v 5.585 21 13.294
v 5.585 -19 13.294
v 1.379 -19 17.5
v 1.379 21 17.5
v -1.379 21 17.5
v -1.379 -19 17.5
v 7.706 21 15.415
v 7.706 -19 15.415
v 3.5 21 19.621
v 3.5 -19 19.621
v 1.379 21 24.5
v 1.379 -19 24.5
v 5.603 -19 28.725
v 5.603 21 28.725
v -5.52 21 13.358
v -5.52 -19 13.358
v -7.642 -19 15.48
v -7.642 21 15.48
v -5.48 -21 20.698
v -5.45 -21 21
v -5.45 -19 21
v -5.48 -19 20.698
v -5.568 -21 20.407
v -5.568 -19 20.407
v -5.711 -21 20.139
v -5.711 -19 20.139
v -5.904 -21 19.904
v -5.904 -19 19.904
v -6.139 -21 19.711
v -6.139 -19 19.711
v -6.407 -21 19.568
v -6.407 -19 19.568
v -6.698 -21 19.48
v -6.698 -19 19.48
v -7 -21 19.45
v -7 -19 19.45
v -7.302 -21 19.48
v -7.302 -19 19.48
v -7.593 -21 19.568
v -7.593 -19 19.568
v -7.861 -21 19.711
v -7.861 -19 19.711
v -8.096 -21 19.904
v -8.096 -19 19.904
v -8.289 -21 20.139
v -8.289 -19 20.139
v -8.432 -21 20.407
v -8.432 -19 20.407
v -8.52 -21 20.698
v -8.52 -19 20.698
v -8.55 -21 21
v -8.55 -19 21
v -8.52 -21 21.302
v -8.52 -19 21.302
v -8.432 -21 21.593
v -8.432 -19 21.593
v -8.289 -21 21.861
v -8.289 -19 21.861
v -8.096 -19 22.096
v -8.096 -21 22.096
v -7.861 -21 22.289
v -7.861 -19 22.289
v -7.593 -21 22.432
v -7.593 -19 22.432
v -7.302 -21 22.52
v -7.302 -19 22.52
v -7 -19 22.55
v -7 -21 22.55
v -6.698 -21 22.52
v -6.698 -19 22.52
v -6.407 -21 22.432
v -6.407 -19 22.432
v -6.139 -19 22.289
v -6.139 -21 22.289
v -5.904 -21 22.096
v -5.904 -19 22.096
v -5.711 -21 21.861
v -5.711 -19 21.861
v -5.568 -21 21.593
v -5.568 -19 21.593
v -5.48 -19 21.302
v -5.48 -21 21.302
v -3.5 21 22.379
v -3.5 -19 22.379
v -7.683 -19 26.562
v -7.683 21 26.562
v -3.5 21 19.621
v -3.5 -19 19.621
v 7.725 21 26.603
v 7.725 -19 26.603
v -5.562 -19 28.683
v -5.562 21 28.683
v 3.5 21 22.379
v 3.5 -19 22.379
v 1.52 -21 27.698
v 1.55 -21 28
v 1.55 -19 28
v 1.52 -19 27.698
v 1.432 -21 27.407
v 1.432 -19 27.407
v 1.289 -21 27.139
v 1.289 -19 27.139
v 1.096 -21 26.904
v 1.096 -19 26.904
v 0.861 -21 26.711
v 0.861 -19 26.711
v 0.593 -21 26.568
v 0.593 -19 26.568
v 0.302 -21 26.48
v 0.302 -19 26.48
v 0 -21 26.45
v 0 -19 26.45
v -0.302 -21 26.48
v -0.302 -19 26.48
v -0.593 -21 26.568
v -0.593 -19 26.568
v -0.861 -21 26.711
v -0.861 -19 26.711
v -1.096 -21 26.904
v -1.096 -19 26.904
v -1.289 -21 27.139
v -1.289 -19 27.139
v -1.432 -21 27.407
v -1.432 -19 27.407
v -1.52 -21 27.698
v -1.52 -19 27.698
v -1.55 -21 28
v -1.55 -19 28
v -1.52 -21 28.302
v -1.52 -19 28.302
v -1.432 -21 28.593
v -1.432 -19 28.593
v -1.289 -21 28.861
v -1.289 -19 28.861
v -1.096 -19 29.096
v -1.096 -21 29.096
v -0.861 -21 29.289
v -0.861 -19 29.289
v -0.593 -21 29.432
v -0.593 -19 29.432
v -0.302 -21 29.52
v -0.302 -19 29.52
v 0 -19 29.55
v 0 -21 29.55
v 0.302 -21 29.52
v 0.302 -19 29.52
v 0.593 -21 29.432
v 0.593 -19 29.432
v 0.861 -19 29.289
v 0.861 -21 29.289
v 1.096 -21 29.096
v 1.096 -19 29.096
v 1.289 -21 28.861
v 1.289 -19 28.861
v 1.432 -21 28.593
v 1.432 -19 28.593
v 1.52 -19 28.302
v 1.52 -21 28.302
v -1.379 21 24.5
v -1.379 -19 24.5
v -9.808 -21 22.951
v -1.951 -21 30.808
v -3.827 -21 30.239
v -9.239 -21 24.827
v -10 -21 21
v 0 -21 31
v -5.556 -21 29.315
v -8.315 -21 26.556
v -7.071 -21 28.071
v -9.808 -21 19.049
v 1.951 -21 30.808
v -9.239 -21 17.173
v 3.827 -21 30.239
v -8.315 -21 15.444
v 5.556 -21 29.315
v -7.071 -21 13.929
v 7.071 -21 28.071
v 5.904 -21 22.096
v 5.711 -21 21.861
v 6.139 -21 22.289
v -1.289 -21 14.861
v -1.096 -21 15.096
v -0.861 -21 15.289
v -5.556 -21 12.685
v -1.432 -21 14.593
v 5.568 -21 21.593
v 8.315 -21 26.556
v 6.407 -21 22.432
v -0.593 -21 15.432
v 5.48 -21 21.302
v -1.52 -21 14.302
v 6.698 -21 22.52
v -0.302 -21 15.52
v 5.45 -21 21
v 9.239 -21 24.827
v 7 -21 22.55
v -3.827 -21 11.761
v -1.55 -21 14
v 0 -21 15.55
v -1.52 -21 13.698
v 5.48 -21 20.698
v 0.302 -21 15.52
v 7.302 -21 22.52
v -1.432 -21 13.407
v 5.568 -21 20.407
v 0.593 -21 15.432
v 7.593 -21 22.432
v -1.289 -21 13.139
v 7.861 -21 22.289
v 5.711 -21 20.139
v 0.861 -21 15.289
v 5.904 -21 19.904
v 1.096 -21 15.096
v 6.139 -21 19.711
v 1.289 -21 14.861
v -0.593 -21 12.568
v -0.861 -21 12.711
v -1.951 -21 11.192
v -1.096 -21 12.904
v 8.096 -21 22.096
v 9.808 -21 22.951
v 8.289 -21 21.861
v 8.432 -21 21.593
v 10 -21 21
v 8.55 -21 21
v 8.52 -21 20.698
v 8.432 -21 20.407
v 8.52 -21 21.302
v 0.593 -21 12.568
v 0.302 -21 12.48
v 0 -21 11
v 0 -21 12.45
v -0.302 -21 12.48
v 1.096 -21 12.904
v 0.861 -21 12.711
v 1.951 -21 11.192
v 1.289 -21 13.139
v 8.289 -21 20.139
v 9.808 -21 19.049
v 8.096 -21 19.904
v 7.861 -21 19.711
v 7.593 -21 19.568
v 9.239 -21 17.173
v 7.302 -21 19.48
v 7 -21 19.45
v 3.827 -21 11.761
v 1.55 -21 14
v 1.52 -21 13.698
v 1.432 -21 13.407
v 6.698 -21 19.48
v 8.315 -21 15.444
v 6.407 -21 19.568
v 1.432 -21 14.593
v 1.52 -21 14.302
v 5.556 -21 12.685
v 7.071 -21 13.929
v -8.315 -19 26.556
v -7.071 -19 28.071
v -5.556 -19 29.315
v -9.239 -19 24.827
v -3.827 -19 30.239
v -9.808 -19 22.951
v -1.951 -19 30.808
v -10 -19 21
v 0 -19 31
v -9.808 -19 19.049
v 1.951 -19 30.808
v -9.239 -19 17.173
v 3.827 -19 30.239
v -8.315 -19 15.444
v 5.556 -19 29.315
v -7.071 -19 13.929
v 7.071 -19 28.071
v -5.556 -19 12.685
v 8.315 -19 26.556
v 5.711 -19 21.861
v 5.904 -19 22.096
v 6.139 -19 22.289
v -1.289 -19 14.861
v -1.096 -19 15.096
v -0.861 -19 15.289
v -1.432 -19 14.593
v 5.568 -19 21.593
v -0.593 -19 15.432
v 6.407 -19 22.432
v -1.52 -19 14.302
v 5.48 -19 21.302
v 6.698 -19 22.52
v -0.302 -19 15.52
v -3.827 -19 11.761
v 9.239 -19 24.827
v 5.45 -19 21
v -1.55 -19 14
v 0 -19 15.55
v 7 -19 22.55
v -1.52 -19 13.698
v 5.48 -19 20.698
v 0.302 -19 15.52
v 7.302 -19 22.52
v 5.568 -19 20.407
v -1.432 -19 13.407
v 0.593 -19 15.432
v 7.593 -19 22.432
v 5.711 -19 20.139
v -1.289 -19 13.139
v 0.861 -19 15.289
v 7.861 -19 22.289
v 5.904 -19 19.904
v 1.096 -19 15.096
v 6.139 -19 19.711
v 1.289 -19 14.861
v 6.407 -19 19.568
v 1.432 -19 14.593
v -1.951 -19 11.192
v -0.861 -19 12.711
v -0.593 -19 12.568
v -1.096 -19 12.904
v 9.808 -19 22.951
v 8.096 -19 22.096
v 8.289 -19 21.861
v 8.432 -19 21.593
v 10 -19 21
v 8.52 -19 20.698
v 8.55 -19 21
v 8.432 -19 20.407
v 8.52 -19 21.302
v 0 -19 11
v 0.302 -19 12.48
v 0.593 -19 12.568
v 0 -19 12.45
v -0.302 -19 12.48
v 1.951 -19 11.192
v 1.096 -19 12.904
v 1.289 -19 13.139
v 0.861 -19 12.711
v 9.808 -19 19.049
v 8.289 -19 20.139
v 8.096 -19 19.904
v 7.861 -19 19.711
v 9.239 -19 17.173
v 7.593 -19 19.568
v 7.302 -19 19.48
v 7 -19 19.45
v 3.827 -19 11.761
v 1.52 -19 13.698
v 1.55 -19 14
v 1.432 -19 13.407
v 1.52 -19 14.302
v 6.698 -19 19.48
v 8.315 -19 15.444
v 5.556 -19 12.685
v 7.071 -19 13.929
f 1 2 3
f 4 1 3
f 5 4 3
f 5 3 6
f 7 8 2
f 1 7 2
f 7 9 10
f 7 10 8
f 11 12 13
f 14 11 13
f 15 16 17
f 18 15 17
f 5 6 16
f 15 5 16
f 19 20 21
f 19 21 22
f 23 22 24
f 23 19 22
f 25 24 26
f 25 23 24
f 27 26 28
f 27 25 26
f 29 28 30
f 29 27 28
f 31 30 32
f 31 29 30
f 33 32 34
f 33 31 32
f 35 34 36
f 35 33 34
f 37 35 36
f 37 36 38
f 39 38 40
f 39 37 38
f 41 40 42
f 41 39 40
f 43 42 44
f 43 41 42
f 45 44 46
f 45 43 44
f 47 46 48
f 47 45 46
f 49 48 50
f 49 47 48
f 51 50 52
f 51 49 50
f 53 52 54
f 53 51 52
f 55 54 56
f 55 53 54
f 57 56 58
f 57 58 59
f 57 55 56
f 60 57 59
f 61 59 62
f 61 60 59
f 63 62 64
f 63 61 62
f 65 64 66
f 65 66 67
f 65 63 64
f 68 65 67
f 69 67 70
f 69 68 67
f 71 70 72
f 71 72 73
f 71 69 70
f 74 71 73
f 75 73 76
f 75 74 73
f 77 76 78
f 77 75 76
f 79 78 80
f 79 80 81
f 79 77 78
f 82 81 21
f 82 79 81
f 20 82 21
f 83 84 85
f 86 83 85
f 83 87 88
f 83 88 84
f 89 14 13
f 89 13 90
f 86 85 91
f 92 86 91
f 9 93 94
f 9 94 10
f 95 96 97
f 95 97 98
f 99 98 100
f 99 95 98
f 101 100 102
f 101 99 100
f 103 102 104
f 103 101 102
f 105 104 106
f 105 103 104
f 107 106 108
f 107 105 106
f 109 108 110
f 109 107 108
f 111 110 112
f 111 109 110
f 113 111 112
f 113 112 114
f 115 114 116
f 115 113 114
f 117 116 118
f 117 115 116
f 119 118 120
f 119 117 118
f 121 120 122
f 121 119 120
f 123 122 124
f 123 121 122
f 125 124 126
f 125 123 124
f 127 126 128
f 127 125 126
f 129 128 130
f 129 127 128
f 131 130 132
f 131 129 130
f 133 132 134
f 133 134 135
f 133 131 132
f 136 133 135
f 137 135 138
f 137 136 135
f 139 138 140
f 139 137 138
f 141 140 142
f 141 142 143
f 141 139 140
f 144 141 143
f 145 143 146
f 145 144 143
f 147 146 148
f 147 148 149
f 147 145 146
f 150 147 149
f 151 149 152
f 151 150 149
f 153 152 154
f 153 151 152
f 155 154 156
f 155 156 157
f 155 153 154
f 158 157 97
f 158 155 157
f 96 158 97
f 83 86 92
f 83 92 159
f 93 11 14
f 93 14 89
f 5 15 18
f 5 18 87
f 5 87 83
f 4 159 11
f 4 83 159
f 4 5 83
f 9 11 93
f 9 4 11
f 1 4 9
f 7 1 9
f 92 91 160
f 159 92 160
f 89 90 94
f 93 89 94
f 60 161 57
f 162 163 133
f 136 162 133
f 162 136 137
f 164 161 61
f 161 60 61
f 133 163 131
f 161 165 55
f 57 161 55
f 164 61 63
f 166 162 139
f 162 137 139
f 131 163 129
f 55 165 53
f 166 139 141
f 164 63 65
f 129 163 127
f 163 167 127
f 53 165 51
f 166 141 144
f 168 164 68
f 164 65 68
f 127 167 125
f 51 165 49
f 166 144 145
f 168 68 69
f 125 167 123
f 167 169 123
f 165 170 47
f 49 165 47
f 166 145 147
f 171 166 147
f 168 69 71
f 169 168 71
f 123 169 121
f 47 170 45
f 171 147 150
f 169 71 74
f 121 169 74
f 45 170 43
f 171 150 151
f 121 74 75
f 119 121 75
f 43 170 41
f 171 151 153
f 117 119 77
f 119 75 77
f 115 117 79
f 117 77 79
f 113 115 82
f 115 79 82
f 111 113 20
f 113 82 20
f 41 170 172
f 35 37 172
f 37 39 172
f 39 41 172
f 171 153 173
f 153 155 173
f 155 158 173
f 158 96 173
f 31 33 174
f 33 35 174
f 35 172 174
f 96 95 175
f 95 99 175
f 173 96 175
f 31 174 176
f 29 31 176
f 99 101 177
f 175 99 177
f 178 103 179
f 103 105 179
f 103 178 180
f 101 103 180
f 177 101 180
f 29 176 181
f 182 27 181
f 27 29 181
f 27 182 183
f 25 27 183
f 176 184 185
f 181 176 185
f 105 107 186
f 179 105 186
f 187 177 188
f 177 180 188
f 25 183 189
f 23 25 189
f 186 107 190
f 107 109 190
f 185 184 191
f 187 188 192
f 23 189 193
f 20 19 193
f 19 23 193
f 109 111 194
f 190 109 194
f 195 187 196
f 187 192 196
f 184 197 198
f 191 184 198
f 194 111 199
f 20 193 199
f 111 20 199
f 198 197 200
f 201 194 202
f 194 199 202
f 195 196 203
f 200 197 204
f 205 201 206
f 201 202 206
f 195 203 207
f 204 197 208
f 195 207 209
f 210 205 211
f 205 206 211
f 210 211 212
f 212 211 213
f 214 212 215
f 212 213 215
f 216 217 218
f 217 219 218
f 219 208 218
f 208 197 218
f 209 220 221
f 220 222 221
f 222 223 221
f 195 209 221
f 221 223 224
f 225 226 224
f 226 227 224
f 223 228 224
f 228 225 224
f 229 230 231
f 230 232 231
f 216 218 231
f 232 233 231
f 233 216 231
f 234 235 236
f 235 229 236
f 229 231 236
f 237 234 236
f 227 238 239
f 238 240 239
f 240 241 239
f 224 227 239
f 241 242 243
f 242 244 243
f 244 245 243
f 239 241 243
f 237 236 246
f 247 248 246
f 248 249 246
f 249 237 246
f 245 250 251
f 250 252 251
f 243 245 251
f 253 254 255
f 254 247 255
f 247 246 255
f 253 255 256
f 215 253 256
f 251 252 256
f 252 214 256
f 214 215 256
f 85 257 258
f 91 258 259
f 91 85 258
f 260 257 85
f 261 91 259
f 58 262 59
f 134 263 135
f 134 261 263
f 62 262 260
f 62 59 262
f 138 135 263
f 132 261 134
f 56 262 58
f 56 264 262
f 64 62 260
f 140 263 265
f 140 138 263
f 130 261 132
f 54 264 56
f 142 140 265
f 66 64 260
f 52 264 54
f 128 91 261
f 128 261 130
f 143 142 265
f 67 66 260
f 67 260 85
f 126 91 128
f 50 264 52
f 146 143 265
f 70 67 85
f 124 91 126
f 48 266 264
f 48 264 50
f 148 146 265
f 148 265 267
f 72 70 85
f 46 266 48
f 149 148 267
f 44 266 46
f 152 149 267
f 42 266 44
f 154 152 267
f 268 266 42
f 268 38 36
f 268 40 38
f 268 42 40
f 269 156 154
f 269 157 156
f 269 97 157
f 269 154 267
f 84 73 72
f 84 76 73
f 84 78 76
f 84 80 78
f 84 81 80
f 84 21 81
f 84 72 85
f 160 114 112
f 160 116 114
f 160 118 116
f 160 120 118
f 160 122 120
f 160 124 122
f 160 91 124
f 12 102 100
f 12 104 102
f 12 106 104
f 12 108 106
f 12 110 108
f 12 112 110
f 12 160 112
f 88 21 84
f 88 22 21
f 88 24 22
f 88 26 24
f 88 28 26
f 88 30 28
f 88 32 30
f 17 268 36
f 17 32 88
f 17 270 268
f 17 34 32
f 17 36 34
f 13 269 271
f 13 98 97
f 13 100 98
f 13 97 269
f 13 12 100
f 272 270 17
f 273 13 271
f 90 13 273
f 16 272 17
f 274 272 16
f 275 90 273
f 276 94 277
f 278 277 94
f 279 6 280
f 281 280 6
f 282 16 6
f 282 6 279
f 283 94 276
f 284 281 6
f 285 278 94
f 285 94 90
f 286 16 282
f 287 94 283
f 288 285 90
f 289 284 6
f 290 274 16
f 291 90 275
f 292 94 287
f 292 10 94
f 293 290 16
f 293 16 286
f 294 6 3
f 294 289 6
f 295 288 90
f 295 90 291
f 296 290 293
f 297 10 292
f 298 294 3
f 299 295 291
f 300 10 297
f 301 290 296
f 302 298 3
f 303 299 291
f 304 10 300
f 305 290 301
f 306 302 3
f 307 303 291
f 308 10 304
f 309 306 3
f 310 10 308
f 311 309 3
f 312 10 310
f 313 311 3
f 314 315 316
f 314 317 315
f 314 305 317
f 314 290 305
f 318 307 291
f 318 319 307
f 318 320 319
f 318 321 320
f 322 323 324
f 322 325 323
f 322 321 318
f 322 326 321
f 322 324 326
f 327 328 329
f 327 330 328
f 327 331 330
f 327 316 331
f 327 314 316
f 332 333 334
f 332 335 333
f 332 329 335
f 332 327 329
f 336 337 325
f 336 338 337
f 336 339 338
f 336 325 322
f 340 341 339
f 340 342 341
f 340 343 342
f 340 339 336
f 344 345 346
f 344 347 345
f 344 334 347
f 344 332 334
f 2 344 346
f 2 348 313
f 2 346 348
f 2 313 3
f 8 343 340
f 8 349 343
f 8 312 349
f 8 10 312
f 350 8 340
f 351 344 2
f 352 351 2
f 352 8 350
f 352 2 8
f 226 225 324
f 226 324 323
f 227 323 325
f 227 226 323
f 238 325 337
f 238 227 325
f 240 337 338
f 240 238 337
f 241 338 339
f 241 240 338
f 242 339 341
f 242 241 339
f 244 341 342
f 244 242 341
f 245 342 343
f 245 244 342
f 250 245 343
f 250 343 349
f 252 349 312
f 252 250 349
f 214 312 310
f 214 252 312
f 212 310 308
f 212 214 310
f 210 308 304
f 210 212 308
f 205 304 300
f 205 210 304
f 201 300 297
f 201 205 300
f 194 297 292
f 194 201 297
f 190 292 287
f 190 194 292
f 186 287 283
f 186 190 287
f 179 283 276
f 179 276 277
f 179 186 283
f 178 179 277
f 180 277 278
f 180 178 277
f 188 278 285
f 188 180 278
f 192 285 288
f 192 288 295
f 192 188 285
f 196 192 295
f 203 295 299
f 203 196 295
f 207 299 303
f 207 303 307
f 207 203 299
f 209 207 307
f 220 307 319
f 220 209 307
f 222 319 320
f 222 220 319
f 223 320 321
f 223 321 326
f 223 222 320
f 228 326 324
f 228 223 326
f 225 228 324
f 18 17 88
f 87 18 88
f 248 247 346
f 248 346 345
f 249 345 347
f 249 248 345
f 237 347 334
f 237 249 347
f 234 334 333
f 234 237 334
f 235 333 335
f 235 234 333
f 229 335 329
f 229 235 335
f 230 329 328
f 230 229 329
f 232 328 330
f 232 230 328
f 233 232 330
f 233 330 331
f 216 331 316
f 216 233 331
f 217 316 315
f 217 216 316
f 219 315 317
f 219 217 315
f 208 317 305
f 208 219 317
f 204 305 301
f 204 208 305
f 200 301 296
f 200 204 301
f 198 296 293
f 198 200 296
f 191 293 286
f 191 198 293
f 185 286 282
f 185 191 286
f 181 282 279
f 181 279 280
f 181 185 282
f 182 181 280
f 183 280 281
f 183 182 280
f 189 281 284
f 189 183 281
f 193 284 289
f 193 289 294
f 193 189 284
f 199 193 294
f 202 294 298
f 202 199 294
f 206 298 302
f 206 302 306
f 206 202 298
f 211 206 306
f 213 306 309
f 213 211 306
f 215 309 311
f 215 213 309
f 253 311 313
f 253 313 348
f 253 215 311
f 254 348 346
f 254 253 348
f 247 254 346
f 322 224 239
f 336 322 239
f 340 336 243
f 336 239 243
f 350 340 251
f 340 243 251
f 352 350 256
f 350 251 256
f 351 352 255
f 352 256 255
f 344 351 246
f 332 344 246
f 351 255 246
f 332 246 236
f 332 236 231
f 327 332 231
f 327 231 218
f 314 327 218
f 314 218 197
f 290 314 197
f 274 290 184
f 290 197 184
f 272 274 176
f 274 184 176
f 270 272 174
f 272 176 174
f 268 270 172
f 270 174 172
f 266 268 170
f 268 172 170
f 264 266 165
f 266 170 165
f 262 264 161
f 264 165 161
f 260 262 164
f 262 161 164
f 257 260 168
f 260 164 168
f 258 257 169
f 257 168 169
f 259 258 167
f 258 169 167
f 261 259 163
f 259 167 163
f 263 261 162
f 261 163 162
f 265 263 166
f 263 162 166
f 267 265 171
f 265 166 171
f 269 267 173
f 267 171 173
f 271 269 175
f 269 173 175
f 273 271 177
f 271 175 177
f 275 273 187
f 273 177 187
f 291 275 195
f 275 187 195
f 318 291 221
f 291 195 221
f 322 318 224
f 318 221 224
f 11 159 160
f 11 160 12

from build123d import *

# Parameters (mm, degrees)
SKETCH1_R             = 10
SKETCH1_R_2           = 1.55
BOSS_EXTRUDE1_DEPTH   = 2
BOSS_EXTRUDE2_DEPTH   = 40
BODY_MOVE_COPY1_ANGLE = 90


with BuildPart() as part:
    # Sketch1 → Boss-Extrude1 (new body)
    with BuildSketch(Plane.XY):
        Circle(SKETCH1_R)
        with Locations((-7, 0)):
            Circle(SKETCH1_R_2, mode=Mode.SUBTRACT)
        with Locations((0, 7)):
            Circle(SKETCH1_R_2, mode=Mode.SUBTRACT)
        with Locations((0, -7)):
            Circle(SKETCH1_R_2, mode=Mode.SUBTRACT)
        with Locations((7, 0)):
            Circle(SKETCH1_R_2, mode=Mode.SUBTRACT)
    extrude(amount=BOSS_EXTRUDE1_DEPTH)

    # Sketch2 → Boss-Extrude2 (add)
    with BuildSketch(Plane.XY.offset(2)):
        Polygon((-1.378679656, -3.5), (1.378679656, -3.5), (5.603334512, -7.724654855), (7.724654855, -5.603334512), (3.5, -1.378679656), (3.5, 1.378679656), (7.705979833, 5.584659489), (5.584659489, 7.705979833), (1.378679656, 3.5), (-1.378679656, 3.5), (-5.520339389, 7.641659733), (-7.641659733, 5.520339389), (-3.5, 1.378679656), (-3.5, -1.378679656), (-7.683338011, -5.562017667), (-5.562017667, -7.683338011), align=None)
    extrude(amount=BOSS_EXTRUDE2_DEPTH)


with BuildPart() as part_1:
    # Body-Move/Copy1: moved
    add(part.part.rotate(Axis((0, 0, 21), (-1, 0, 0)), BODY_MOVE_COPY1_ANGLE))


solid = part_1.part
